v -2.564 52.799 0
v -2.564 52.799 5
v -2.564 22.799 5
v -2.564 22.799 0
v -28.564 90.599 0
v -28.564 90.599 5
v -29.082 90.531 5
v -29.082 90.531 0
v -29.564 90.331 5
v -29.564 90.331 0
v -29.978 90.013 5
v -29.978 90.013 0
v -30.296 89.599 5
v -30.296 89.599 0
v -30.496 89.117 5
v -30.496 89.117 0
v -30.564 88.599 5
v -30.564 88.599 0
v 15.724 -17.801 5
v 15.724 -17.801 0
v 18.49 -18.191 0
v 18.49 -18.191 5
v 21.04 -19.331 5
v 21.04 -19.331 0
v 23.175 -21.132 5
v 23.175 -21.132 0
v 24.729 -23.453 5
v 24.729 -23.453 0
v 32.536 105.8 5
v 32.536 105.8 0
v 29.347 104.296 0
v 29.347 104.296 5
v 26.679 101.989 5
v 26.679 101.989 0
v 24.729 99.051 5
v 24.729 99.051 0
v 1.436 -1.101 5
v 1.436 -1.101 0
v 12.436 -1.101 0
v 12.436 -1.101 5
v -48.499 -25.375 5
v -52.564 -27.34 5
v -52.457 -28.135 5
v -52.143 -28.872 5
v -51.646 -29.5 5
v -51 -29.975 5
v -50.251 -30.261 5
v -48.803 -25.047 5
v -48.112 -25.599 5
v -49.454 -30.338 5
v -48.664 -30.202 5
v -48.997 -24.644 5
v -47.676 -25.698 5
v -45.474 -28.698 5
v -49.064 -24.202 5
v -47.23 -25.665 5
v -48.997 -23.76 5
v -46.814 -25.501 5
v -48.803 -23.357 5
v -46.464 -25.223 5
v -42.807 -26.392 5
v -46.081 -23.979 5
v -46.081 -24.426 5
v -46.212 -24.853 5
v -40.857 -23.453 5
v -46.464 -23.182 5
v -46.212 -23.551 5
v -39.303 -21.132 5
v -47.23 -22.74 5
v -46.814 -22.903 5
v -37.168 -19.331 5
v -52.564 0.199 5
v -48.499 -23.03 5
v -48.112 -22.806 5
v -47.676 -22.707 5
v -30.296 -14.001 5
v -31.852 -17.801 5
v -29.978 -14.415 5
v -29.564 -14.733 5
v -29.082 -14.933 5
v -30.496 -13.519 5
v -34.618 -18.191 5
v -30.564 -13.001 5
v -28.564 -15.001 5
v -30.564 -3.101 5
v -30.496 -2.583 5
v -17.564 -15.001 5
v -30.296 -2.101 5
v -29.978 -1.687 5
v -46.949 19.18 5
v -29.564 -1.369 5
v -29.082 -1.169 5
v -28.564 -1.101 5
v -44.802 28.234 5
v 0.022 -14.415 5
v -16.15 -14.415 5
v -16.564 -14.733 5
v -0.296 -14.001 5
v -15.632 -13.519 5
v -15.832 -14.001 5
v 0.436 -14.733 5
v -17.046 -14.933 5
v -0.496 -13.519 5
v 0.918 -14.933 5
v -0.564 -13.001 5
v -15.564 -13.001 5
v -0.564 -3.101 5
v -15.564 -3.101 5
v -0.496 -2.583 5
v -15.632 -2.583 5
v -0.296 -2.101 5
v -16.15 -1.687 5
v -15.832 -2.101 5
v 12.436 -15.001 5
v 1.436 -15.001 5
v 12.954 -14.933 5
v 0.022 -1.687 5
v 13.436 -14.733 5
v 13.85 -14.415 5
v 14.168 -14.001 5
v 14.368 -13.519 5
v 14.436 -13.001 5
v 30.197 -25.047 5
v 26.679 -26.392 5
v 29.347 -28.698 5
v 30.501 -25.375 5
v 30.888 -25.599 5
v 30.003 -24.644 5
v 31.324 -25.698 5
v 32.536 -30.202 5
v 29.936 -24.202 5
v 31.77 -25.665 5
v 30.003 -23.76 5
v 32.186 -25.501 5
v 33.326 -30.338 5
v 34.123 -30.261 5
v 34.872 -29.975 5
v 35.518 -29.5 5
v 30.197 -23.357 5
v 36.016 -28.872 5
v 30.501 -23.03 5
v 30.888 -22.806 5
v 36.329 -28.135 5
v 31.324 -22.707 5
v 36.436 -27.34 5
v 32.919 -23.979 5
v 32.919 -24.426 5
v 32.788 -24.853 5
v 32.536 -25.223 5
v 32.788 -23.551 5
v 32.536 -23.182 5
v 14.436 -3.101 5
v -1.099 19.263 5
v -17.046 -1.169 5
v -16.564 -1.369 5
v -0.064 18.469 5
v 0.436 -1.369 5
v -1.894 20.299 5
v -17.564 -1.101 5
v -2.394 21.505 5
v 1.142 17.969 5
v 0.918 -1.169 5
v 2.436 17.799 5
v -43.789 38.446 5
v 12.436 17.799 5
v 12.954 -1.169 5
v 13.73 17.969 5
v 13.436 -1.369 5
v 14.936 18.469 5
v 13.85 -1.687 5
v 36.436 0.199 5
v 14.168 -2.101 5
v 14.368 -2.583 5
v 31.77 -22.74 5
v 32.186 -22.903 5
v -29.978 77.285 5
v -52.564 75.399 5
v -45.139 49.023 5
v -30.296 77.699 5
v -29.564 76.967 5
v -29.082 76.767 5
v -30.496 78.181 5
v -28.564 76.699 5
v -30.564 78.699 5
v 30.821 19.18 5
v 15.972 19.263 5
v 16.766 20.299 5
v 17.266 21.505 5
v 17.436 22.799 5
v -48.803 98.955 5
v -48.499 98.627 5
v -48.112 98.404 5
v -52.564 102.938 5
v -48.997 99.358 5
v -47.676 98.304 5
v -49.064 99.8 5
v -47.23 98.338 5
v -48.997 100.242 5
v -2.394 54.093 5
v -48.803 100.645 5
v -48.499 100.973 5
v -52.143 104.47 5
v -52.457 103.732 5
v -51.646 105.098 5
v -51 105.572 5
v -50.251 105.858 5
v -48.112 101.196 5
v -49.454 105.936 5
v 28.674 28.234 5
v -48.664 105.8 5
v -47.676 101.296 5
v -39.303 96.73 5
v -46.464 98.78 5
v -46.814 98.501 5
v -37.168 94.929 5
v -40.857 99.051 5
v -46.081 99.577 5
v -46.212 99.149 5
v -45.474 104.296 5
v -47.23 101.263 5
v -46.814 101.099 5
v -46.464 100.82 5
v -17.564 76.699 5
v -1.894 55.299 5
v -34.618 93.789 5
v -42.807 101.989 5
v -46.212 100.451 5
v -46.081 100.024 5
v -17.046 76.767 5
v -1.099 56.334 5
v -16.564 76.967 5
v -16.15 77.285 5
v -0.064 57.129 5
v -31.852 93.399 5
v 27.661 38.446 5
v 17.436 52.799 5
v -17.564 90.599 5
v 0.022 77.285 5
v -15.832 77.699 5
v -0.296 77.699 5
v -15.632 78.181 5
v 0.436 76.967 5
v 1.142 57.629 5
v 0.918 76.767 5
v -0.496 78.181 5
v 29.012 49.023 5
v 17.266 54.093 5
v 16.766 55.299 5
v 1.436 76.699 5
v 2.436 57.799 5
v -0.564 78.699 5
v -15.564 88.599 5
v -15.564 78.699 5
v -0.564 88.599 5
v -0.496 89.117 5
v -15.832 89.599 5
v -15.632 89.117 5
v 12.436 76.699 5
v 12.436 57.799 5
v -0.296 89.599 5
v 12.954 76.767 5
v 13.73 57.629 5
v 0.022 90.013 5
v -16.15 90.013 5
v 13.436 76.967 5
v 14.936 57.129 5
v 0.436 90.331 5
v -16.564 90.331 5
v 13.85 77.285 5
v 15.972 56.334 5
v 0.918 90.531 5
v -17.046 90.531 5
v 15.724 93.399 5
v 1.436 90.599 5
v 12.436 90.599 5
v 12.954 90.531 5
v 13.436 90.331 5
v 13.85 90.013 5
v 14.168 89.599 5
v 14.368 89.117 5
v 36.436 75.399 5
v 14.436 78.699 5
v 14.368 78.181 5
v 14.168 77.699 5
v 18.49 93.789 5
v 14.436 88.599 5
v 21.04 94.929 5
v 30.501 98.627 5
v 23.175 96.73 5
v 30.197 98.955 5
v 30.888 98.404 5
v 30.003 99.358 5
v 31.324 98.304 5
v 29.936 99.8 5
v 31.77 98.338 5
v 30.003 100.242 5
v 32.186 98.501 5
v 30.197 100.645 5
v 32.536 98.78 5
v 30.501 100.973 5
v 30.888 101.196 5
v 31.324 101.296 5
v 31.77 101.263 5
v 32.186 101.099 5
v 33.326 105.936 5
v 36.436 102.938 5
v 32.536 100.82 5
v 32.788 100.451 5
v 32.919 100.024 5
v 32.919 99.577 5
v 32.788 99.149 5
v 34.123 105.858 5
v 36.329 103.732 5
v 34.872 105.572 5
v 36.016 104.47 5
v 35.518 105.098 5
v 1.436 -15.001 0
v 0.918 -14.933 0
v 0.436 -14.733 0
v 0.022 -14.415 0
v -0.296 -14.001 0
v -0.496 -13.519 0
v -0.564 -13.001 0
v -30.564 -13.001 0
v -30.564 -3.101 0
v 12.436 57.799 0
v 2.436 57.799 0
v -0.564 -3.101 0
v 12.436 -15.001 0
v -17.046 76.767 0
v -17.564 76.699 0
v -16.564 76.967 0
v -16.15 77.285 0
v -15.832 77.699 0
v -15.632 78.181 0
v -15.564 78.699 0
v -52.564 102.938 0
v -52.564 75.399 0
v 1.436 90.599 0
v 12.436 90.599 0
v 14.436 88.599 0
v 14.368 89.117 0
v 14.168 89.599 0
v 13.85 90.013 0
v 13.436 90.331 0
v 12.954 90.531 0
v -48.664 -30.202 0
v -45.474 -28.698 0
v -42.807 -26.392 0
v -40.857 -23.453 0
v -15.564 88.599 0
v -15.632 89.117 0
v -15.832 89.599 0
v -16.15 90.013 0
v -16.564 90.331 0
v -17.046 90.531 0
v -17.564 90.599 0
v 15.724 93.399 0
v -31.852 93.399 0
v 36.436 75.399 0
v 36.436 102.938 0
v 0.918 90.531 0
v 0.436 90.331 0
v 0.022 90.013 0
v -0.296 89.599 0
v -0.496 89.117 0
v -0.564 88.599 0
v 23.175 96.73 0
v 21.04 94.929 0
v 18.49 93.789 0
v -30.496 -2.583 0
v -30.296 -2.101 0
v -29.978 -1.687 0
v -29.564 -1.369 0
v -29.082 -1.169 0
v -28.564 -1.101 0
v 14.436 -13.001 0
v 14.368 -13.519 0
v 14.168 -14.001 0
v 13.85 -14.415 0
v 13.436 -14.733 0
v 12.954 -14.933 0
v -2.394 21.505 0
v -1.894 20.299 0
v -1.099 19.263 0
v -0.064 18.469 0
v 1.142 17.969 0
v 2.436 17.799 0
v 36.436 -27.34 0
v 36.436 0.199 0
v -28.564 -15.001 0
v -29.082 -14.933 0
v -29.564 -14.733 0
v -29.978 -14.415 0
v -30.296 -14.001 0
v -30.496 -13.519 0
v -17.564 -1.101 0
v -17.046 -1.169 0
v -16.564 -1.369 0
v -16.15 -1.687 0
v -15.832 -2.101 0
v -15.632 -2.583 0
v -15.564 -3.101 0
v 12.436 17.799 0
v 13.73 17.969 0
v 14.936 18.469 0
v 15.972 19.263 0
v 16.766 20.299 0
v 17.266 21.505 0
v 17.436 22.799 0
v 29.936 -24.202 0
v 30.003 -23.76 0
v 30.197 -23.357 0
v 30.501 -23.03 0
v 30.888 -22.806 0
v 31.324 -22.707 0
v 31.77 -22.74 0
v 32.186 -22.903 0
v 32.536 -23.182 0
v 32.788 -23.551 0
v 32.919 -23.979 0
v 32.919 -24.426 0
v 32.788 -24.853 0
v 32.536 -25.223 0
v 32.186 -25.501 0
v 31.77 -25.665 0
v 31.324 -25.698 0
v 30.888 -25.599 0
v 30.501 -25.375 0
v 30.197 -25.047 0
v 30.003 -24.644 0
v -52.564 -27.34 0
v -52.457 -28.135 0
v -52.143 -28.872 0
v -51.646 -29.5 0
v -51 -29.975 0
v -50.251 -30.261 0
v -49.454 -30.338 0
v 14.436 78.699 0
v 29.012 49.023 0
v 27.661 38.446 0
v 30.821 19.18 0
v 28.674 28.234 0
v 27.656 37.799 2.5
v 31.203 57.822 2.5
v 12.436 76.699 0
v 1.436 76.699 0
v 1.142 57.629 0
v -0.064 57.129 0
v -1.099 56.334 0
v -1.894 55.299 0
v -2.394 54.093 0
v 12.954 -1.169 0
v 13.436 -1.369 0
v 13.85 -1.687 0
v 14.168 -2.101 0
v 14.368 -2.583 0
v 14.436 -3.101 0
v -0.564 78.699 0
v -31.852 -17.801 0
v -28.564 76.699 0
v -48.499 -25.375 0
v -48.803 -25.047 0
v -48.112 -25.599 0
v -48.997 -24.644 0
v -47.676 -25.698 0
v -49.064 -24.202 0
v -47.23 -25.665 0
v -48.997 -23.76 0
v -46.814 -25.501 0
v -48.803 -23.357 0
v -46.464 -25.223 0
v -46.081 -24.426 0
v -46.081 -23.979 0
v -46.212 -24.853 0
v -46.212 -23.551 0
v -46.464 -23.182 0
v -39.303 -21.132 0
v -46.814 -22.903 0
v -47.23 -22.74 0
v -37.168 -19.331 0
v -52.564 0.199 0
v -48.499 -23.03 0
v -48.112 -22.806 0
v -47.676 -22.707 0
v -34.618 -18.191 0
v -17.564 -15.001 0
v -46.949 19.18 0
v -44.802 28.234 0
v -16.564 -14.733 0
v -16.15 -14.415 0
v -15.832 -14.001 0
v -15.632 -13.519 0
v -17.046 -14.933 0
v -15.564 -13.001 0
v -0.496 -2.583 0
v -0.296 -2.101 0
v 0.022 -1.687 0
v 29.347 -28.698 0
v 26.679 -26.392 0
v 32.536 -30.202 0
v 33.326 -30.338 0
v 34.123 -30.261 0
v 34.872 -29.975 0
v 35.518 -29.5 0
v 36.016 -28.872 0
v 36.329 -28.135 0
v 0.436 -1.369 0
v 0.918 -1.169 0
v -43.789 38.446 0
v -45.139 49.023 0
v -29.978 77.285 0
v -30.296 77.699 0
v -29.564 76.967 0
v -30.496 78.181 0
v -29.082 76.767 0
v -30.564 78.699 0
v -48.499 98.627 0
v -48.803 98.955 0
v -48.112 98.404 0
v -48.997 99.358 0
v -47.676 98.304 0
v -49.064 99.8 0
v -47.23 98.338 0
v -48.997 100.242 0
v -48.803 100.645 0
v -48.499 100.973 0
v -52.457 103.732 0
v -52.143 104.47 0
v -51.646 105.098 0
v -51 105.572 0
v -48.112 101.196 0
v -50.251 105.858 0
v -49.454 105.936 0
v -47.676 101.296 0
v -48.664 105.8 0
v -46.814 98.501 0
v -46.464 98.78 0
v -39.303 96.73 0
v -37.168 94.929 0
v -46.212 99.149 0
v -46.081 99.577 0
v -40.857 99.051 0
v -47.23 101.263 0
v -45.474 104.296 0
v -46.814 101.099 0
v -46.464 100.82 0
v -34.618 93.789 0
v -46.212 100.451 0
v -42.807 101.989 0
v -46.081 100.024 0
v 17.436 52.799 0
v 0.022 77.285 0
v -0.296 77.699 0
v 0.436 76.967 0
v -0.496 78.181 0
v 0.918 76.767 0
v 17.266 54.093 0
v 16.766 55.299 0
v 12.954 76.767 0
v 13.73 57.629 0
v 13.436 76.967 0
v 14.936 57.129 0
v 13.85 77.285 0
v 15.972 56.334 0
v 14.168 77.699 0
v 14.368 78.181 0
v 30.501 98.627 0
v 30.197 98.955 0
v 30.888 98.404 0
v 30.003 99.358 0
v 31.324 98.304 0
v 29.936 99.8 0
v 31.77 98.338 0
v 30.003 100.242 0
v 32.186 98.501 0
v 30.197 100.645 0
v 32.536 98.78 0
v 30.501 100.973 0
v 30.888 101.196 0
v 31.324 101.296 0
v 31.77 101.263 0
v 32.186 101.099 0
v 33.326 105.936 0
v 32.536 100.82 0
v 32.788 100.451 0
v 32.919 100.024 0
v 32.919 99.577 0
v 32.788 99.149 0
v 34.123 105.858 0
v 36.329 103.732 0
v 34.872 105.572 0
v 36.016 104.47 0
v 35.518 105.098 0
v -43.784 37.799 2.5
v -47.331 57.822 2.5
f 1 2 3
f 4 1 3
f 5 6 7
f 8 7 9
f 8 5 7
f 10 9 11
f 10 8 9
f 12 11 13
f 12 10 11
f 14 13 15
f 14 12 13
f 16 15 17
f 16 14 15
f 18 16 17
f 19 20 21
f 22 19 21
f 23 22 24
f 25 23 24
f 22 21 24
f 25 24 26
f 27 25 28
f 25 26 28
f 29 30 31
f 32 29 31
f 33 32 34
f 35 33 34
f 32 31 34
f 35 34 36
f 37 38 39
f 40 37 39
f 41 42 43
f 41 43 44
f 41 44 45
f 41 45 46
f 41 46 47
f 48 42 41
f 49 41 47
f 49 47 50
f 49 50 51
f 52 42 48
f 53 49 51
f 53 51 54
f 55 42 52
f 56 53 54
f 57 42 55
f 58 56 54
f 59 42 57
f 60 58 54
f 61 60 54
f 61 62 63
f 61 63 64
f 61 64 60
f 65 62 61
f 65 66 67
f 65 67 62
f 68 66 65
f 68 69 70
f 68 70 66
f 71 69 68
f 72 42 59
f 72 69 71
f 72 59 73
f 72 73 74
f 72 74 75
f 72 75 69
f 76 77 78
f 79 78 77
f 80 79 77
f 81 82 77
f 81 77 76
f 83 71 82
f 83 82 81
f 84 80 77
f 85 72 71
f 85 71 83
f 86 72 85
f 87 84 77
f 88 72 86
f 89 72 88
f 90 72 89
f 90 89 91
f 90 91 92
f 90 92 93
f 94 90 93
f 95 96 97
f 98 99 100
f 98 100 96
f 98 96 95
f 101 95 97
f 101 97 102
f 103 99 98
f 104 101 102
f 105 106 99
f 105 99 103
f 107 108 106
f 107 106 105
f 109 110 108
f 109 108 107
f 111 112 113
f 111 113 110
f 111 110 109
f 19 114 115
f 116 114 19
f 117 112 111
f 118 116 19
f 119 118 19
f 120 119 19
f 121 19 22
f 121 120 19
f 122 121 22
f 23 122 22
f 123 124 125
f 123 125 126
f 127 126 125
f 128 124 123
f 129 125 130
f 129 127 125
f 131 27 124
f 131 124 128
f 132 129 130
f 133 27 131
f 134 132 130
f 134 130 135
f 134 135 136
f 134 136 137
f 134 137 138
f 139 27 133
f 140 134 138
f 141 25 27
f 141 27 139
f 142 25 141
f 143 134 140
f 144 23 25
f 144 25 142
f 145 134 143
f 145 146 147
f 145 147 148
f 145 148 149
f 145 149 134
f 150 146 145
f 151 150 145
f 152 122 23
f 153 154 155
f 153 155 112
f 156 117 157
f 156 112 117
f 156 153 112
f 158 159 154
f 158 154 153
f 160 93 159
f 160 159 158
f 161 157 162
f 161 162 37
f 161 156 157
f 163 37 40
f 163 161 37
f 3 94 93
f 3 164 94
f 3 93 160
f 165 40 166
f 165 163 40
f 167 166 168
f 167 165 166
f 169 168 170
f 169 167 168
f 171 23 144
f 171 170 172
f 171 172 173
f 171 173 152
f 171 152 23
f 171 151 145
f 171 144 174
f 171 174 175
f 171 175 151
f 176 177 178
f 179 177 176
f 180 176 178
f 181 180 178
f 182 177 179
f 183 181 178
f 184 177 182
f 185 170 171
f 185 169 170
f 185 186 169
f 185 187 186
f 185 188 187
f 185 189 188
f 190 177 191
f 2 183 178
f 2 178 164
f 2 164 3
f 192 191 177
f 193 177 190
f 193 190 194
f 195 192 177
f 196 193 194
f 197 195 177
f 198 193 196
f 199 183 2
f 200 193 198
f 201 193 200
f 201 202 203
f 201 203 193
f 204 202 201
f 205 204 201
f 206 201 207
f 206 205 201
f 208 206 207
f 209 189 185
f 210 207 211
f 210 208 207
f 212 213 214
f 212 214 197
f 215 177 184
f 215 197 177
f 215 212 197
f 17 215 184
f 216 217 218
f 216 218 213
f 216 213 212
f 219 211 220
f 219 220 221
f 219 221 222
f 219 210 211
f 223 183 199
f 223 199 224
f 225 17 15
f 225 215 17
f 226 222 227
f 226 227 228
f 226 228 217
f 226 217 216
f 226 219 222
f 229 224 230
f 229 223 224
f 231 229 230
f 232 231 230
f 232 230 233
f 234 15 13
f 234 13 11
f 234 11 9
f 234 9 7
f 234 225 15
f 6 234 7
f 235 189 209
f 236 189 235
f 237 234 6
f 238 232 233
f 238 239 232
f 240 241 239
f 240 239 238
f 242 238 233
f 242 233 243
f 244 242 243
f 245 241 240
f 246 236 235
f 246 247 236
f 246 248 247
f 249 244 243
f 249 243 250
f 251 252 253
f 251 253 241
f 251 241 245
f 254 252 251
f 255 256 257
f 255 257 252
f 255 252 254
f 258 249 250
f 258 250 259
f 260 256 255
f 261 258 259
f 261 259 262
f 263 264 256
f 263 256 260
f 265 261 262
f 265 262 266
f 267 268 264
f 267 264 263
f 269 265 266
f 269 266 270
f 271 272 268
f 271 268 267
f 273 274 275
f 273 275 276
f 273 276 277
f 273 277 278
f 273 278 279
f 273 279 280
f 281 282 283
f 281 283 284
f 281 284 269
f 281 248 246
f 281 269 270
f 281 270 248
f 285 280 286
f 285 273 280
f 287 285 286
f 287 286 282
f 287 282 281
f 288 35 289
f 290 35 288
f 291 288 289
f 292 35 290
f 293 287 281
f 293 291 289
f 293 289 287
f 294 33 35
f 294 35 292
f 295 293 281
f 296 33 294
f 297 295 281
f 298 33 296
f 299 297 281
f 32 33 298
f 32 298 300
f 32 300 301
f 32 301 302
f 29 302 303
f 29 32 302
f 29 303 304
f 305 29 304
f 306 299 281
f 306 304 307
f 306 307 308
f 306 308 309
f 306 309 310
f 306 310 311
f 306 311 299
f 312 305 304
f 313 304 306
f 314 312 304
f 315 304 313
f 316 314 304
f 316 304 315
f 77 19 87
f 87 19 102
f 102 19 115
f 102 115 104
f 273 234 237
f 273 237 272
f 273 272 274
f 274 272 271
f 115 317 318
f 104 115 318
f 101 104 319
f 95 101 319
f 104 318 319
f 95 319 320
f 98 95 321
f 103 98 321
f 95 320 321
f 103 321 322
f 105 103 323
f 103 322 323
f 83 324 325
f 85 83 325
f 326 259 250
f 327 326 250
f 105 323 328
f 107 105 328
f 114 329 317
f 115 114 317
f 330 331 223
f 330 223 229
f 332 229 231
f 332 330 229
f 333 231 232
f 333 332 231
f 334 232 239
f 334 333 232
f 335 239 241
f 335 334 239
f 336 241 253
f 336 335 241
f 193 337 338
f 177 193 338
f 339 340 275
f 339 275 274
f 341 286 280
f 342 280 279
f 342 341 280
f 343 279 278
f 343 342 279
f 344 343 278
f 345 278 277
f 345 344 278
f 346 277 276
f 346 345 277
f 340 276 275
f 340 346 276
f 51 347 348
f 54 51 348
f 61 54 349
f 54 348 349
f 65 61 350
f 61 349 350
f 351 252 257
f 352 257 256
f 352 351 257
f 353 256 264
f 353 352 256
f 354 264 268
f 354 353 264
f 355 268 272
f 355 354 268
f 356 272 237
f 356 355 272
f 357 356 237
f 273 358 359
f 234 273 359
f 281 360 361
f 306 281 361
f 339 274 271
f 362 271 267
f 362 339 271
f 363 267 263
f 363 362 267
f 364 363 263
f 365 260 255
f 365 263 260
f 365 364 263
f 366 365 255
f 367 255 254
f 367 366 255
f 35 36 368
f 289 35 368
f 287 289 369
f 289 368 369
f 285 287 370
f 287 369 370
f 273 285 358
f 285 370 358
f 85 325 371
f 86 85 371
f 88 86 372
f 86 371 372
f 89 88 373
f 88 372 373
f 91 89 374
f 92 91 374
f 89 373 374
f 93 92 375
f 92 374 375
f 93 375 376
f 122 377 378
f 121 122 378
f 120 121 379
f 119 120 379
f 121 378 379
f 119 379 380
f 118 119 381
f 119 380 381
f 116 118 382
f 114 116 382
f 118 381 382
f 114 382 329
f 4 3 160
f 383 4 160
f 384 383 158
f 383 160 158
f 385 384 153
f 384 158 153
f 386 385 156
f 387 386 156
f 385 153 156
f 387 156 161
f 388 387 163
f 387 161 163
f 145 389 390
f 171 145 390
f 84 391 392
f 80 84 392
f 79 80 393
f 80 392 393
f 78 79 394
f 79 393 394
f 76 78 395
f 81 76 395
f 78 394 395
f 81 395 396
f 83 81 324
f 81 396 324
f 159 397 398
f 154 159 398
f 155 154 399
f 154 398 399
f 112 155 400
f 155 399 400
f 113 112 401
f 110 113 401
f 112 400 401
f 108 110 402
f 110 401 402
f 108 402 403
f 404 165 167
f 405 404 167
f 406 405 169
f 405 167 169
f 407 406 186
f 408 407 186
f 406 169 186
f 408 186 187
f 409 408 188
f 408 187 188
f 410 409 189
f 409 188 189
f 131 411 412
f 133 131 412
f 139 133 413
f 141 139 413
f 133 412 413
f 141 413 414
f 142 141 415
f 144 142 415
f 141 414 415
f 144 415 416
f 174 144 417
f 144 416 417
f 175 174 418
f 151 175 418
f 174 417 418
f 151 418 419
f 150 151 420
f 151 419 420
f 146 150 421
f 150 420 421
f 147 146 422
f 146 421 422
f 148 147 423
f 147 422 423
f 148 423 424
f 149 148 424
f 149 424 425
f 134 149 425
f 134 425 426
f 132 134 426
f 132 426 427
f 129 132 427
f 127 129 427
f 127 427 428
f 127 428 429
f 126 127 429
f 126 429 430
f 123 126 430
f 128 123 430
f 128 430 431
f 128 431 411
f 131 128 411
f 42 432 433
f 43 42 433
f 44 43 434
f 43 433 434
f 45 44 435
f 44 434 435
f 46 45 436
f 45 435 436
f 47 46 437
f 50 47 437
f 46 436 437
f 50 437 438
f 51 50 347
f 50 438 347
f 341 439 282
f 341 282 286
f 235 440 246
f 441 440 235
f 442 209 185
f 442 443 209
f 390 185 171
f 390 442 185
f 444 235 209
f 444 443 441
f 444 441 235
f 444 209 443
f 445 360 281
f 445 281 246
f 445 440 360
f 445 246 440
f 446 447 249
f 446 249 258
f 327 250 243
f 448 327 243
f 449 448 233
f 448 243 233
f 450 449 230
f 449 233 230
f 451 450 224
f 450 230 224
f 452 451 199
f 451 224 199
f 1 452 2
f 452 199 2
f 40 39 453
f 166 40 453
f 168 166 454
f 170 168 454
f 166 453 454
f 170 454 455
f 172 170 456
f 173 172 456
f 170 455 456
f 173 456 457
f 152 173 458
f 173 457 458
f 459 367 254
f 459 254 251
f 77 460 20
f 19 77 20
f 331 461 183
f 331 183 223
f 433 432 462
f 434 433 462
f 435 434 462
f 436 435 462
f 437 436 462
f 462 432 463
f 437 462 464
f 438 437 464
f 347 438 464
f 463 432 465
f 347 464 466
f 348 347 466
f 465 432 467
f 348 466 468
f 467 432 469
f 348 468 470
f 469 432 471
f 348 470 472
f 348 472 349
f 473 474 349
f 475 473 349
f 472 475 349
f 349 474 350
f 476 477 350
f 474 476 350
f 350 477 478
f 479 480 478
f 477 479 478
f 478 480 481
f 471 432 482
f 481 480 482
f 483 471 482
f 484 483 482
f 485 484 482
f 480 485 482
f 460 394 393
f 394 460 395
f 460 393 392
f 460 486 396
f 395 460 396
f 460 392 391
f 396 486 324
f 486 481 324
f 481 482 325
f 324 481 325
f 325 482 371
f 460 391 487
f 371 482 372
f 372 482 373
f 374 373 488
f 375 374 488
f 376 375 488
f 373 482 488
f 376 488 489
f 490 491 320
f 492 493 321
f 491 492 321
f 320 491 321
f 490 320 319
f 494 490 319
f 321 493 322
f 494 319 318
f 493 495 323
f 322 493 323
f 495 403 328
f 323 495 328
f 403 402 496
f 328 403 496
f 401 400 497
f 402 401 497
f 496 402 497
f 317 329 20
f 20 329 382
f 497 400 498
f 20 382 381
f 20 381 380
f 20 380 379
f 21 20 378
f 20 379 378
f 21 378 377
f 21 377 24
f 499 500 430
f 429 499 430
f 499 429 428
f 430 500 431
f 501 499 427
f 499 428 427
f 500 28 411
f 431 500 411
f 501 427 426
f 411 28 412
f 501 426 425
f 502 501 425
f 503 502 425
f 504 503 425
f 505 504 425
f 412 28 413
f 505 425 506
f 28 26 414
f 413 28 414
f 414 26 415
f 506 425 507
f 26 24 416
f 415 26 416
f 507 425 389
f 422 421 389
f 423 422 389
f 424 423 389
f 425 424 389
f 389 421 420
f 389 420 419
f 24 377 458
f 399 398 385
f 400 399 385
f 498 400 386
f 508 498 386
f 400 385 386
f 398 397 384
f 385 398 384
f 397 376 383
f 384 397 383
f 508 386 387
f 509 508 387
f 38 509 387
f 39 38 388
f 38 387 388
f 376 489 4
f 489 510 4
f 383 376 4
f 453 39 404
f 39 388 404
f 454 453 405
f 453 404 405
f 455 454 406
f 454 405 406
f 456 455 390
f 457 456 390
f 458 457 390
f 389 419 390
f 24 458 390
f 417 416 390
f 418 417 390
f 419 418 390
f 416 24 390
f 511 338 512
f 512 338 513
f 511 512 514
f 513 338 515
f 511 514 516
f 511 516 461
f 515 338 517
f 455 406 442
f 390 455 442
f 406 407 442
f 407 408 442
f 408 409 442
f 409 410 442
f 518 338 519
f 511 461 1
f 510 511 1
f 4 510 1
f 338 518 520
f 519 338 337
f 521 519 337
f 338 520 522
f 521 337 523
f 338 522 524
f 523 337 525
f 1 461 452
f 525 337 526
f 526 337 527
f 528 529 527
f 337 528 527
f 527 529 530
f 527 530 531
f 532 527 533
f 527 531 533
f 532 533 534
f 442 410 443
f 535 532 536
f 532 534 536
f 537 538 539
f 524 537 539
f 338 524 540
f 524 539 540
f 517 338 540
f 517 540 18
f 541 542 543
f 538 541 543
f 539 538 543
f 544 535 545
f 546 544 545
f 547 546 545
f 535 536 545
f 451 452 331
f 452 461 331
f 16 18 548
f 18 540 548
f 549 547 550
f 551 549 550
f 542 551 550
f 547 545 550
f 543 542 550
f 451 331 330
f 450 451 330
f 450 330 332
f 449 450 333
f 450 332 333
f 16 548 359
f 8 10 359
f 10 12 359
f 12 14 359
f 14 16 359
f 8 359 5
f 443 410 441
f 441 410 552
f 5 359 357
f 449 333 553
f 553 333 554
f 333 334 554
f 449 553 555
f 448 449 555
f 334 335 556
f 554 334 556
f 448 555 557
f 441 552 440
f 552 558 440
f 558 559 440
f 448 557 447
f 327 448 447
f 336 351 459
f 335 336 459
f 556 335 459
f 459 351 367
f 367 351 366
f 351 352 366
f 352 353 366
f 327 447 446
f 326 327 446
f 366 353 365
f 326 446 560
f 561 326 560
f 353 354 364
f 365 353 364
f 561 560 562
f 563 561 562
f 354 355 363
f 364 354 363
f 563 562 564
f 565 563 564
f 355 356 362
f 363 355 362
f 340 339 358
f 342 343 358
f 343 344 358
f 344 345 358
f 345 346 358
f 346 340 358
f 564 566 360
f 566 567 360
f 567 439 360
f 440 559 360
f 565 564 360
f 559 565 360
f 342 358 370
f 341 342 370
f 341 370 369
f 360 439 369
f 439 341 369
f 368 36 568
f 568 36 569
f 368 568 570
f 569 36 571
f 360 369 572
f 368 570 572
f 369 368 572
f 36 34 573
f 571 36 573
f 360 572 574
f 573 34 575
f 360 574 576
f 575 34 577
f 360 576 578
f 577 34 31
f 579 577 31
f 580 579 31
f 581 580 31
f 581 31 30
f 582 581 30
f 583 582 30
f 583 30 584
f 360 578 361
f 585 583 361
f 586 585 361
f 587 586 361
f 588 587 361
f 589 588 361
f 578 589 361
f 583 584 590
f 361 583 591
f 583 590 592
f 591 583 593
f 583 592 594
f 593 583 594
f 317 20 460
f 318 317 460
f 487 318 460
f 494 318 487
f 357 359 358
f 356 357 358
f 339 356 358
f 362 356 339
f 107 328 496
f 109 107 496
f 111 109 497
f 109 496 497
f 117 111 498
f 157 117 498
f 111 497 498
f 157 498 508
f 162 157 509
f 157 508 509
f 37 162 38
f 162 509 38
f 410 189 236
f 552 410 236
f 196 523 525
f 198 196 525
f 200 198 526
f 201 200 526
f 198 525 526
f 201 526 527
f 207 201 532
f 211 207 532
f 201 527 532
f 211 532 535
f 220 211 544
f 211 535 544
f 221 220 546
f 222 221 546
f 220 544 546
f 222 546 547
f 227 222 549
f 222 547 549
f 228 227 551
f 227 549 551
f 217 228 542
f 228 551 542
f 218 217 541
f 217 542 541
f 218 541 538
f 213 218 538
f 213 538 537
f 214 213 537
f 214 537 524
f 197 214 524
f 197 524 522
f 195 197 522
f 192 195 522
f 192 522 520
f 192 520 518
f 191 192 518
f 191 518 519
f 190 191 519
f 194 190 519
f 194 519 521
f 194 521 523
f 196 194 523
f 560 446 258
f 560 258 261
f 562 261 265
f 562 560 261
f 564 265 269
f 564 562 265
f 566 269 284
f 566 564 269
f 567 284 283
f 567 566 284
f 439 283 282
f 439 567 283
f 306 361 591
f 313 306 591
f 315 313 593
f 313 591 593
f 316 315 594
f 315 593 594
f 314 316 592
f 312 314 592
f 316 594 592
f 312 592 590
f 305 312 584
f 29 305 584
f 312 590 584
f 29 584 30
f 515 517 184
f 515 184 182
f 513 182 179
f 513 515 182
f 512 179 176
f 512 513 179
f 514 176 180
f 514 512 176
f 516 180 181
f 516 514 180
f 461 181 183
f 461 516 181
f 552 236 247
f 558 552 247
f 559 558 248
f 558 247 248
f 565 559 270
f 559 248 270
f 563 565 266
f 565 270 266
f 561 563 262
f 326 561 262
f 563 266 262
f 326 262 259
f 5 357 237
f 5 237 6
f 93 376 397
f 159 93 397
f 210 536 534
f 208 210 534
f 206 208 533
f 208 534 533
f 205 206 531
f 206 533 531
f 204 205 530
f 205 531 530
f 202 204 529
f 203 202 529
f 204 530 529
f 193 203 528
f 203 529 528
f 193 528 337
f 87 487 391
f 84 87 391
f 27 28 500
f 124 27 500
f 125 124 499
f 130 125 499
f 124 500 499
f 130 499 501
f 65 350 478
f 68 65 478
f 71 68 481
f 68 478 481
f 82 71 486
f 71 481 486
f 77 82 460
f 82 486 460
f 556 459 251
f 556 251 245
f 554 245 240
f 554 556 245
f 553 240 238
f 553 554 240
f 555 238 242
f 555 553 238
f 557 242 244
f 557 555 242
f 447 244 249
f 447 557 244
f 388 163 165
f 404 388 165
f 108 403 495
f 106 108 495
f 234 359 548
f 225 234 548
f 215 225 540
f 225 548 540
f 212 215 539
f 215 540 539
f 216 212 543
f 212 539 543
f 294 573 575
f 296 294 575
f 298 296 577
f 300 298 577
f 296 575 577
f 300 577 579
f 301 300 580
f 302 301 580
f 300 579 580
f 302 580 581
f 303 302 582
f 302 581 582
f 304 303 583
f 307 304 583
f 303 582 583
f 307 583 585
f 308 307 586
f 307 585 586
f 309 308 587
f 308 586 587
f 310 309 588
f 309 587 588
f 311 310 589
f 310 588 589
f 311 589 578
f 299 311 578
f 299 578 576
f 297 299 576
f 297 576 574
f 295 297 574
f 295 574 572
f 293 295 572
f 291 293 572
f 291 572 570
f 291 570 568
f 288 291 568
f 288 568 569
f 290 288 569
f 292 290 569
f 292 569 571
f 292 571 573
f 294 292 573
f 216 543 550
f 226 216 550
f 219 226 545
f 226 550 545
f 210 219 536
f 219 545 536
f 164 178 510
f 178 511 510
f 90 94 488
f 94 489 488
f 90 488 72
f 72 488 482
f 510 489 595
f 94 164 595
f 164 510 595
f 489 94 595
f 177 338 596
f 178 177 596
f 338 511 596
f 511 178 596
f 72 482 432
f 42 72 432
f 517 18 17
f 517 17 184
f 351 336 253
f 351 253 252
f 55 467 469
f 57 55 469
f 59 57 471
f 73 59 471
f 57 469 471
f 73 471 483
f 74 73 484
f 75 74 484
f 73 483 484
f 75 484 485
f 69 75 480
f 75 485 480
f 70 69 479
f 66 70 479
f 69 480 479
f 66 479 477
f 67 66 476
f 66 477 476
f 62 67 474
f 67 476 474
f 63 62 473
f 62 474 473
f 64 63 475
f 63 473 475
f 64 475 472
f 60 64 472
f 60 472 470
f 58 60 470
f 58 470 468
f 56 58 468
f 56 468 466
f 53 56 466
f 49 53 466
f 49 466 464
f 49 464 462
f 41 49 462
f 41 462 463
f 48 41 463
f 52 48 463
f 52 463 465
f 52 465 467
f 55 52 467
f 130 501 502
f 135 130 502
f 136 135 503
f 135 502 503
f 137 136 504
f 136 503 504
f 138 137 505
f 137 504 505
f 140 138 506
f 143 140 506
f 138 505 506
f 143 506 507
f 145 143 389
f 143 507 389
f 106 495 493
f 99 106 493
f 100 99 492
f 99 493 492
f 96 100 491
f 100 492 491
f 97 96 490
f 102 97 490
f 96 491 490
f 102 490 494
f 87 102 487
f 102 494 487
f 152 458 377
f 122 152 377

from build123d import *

# Parameters (mm, degrees)
RESSALTO_EXTRUS_O3_DEPTH = 5
ESBO_O4_R                = 1.5
CORTE_EXTRUS_O3_DEPTH    = 10
CORTE_EXTRUS_O4_DEPTH    = 10


with BuildPart() as part:
    # Esboço1 → Ressalto-extrusão3 (new body)
    with BuildSketch(Plane.XY):
        with BuildLine():
            Line((-31.851570772, -17.801096987), (-27.063885949, -17.801096987))
            Line((-27.063885949, -17.801096987), (10.936114051, -17.801096987))
            Line((10.936114051, -17.801096987), (15.723798874, -17.801096987))
            ThreePointArc((15.723798874, -17.801096987), (21.039894205, -19.331201448), (24.729153299, -23.4532709))
            ThreePointArc((24.729153299, -23.4532709), (27.934250919, -27.635644423), (32.536114051, -30.202306605))
            ThreePointArc((32.536114051, -30.202306605), (35.210937986, -29.759166326), (36.436114051, -27.340489001))
            Line((36.436114051, -27.340489001), (36.436114051, -17.801096987))
            Line((36.436114051, -17.801096987), (36.436114051, 0.198903013))
            add(Edge.make_bspline(
                [(36.436114051, 75.398903013), (24.729153299, 37.798903013), (36.436114051, 0.198903013)],
                knots=[0, 0, 0, 1, 1, 1], degree=2, weights=[1, 3, 1]))
            Line((36.436114051, 75.398903013), (36.436114051, 93.398903013))
            Line((36.436114051, 93.398903013), (36.436114051, 102.938295027))
            ThreePointArc((36.436114051, 102.938295027), (35.210937986, 105.356972352), (32.536114051, 105.800112631))
            ThreePointArc((32.536114051, 105.800112631), (27.934250919, 103.23345045), (24.729153299, 99.051076926))
            ThreePointArc((24.729153299, 99.051076926), (21.039894205, 94.929007474), (15.723798874, 93.398903013))
            Line((15.723798874, 93.398903013), (10.936114051, 93.398903013))
            Line((10.936114051, 93.398903013), (-27.063885949, 93.398903013))
            Line((-27.063885949, 93.398903013), (-31.851570772, 93.398903013))
            ThreePointArc((-31.851570772, 93.398903013), (-37.167666102, 94.929007474), (-40.856925197, 99.051076926))
            ThreePointArc((-40.856925197, 99.051076926), (-44.062022817, 103.23345045), (-48.663885949, 105.800112631))
            ThreePointArc((-48.663885949, 105.800112631), (-51.338709884, 105.356972352), (-52.563885949, 102.938295027))
            Line((-52.563885949, 102.938295027), (-52.563885949, 93.398903013))
            Line((-52.563885949, 93.398903013), (-52.563885949, 75.398903013))
            add(Edge.make_bspline(
                [(-52.563885949, 75.398903013), (-40.856925197, 37.798903013), (-52.563885949, 0.198903013)],
                knots=[0, 0, 0, 1, 1, 1], degree=2, weights=[1, 3, 1]))
            Line((-52.563885949, 0.198903013), (-52.563885949, -17.801096987))
            Line((-52.563885949, -17.801096987), (-52.563885949, -27.340489001))
            ThreePointArc((-52.563885949, -27.340489001), (-51.338709884, -29.759166326), (-48.663885949, -30.202306605))
            ThreePointArc((-48.663885949, -30.202306605), (-44.062022817, -27.635644423), (-40.856925197, -23.4532709))
            ThreePointArc((-40.856925197, -23.4532709), (-37.167666102, -19.331201448), (-31.851570772, -17.801096987))
        make_face()
    extrude(amount=RESSALTO_EXTRUS_O3_DEPTH)

    # Esboço4 → Corte-extrusão3 (cut)
    with BuildSketch(Plane(origin=(0, 0, 0), x_dir=(-1, 0, 0), z_dir=(0, 0, -1))):
        with Locations((-31.436114051, 99.800112631)):
            Circle(ESBO_O4_R)
        with Locations((47.563885949, 99.800112631)):
            Circle(ESBO_O4_R)
        with Locations((47.563885949, -24.202306605)):
            Circle(ESBO_O4_R)
        with Locations((-31.436114051, -24.202306605)):
            Circle(ESBO_O4_R)
        with BuildLine():
            Line((-12.436114051, 90.598903013), (-1.436114051, 90.598903013))
            ThreePointArc((-1.436114051, 90.598903013), (-0.021900489, 90.013116575), (0.563885949, 88.598903013))
            Line((0.563885949, 88.598903013), (0.563885949, 78.698903013))
            ThreePointArc((0.563885949, 78.698903013), (-0.021900489, 77.284689451), (-1.436114051, 76.698903013))
            Line((-1.436114051, 76.698903013), (-12.436114051, 76.698903013))
            ThreePointArc((-12.436114051, 76.698903013), (-13.850327613, 77.284689451), (-14.436114051, 78.698903013))
            Line((-14.436114051, 78.698903013), (-14.436114051, 88.598903013))
            ThreePointArc((-14.436114051, 88.598903013), (-13.850327613, 90.013116575), (-12.436114051, 90.598903013))
        make_face()
        with BuildLine():
            Line((17.563885949, 90.598903013), (28.563885949, 90.598903013))
            ThreePointArc((28.563885949, 90.598903013), (29.978099511, 90.013116575), (30.563885949, 88.598903013))
            Line((30.563885949, 88.598903013), (30.563885949, 78.698903013))
            ThreePointArc((30.563885949, 78.698903013), (29.978099511, 77.284689451), (28.563885949, 76.698903013))
            Line((28.563885949, 76.698903013), (17.563885949, 76.698903013))
            ThreePointArc((17.563885949, 76.698903013), (16.149672387, 77.284689451), (15.563885949, 78.698903013))
            Line((15.563885949, 78.698903013), (15.563885949, 88.598903013))
            ThreePointArc((15.563885949, 88.598903013), (16.149672387, 90.013116575), (17.563885949, 90.598903013))
        make_face()
        with BuildLine():
            Line((30.563885949, -13.001096987), (30.563885949, -3.101096987))
            ThreePointArc((30.563885949, -3.101096987), (29.978099511, -1.686883425), (28.563885949, -1.101096987))
            Line((28.563885949, -1.101096987), (17.563885949, -1.101096987))
            ThreePointArc((17.563885949, -1.101096987), (16.149672387, -1.686883425), (15.563885949, -3.101096987))
            Line((15.563885949, -3.101096987), (15.563885949, -13.001096987))
            ThreePointArc((15.563885949, -13.001096987), (16.149672387, -14.415310549), (17.563885949, -15.001096987))
            Line((17.563885949, -15.001096987), (28.563885949, -15.001096987))
            ThreePointArc((28.563885949, -15.001096987), (29.978099511, -14.415310549), (30.563885949, -13.001096987))
        make_face()
        with BuildLine():
            Line((0.563885949, -13.001096987), (0.563885949, -3.101096987))
            ThreePointArc((0.563885949, -3.101096987), (-0.021900489, -1.686883425), (-1.436114051, -1.101096987))
            Line((-1.436114051, -1.101096987), (-12.436114051, -1.101096987))
            ThreePointArc((-12.436114051, -1.101096987), (-13.850327613, -1.686883425), (-14.436114051, -3.101096987))
            Line((-14.436114051, -3.101096987), (-14.436114051, -13.001096987))
            ThreePointArc((-14.436114051, -13.001096987), (-13.850327613, -14.415310549), (-12.436114051, -15.001096987))
            Line((-12.436114051, -15.001096987), (-1.436114051, -15.001096987))
            ThreePointArc((-1.436114051, -15.001096987), (-0.021900489, -14.415310549), (0.563885949, -13.001096987))
        make_face()
    extrude(amount=-CORTE_EXTRUS_O3_DEPTH, mode=Mode.SUBTRACT)

    # Esboço5 → Corte-extrusão4 (cut)
    with BuildSketch(Plane.XY.offset(5)):
        with BuildLine():
            Line((2.436114051, 17.798903013), (12.436114051, 17.798903013))
            ThreePointArc((12.436114051, 17.798903013), (15.971647957, 19.263369107), (17.436114051, 22.798903013))
            Line((17.436114051, 22.798903013), (17.436114051, 52.798903013))
            ThreePointArc((17.436114051, 52.798903013), (15.971647957, 56.334436919), (12.436114051, 57.798903013))
            Line((12.436114051, 57.798903013), (2.436114051, 57.798903013))
            ThreePointArc((2.436114051, 57.798903013), (-1.099419855, 56.334436919), (-2.563885949, 52.798903013))
            Line((-2.563885949, 52.798903013), (-2.563885949, 22.798903013))
            ThreePointArc((-2.563885949, 22.798903013), (-1.099419855, 19.263369107), (2.436114051, 17.798903013))
        make_face()
    extrude(amount=-CORTE_EXTRUS_O4_DEPTH, mode=Mode.SUBTRACT)


solid = part.part
